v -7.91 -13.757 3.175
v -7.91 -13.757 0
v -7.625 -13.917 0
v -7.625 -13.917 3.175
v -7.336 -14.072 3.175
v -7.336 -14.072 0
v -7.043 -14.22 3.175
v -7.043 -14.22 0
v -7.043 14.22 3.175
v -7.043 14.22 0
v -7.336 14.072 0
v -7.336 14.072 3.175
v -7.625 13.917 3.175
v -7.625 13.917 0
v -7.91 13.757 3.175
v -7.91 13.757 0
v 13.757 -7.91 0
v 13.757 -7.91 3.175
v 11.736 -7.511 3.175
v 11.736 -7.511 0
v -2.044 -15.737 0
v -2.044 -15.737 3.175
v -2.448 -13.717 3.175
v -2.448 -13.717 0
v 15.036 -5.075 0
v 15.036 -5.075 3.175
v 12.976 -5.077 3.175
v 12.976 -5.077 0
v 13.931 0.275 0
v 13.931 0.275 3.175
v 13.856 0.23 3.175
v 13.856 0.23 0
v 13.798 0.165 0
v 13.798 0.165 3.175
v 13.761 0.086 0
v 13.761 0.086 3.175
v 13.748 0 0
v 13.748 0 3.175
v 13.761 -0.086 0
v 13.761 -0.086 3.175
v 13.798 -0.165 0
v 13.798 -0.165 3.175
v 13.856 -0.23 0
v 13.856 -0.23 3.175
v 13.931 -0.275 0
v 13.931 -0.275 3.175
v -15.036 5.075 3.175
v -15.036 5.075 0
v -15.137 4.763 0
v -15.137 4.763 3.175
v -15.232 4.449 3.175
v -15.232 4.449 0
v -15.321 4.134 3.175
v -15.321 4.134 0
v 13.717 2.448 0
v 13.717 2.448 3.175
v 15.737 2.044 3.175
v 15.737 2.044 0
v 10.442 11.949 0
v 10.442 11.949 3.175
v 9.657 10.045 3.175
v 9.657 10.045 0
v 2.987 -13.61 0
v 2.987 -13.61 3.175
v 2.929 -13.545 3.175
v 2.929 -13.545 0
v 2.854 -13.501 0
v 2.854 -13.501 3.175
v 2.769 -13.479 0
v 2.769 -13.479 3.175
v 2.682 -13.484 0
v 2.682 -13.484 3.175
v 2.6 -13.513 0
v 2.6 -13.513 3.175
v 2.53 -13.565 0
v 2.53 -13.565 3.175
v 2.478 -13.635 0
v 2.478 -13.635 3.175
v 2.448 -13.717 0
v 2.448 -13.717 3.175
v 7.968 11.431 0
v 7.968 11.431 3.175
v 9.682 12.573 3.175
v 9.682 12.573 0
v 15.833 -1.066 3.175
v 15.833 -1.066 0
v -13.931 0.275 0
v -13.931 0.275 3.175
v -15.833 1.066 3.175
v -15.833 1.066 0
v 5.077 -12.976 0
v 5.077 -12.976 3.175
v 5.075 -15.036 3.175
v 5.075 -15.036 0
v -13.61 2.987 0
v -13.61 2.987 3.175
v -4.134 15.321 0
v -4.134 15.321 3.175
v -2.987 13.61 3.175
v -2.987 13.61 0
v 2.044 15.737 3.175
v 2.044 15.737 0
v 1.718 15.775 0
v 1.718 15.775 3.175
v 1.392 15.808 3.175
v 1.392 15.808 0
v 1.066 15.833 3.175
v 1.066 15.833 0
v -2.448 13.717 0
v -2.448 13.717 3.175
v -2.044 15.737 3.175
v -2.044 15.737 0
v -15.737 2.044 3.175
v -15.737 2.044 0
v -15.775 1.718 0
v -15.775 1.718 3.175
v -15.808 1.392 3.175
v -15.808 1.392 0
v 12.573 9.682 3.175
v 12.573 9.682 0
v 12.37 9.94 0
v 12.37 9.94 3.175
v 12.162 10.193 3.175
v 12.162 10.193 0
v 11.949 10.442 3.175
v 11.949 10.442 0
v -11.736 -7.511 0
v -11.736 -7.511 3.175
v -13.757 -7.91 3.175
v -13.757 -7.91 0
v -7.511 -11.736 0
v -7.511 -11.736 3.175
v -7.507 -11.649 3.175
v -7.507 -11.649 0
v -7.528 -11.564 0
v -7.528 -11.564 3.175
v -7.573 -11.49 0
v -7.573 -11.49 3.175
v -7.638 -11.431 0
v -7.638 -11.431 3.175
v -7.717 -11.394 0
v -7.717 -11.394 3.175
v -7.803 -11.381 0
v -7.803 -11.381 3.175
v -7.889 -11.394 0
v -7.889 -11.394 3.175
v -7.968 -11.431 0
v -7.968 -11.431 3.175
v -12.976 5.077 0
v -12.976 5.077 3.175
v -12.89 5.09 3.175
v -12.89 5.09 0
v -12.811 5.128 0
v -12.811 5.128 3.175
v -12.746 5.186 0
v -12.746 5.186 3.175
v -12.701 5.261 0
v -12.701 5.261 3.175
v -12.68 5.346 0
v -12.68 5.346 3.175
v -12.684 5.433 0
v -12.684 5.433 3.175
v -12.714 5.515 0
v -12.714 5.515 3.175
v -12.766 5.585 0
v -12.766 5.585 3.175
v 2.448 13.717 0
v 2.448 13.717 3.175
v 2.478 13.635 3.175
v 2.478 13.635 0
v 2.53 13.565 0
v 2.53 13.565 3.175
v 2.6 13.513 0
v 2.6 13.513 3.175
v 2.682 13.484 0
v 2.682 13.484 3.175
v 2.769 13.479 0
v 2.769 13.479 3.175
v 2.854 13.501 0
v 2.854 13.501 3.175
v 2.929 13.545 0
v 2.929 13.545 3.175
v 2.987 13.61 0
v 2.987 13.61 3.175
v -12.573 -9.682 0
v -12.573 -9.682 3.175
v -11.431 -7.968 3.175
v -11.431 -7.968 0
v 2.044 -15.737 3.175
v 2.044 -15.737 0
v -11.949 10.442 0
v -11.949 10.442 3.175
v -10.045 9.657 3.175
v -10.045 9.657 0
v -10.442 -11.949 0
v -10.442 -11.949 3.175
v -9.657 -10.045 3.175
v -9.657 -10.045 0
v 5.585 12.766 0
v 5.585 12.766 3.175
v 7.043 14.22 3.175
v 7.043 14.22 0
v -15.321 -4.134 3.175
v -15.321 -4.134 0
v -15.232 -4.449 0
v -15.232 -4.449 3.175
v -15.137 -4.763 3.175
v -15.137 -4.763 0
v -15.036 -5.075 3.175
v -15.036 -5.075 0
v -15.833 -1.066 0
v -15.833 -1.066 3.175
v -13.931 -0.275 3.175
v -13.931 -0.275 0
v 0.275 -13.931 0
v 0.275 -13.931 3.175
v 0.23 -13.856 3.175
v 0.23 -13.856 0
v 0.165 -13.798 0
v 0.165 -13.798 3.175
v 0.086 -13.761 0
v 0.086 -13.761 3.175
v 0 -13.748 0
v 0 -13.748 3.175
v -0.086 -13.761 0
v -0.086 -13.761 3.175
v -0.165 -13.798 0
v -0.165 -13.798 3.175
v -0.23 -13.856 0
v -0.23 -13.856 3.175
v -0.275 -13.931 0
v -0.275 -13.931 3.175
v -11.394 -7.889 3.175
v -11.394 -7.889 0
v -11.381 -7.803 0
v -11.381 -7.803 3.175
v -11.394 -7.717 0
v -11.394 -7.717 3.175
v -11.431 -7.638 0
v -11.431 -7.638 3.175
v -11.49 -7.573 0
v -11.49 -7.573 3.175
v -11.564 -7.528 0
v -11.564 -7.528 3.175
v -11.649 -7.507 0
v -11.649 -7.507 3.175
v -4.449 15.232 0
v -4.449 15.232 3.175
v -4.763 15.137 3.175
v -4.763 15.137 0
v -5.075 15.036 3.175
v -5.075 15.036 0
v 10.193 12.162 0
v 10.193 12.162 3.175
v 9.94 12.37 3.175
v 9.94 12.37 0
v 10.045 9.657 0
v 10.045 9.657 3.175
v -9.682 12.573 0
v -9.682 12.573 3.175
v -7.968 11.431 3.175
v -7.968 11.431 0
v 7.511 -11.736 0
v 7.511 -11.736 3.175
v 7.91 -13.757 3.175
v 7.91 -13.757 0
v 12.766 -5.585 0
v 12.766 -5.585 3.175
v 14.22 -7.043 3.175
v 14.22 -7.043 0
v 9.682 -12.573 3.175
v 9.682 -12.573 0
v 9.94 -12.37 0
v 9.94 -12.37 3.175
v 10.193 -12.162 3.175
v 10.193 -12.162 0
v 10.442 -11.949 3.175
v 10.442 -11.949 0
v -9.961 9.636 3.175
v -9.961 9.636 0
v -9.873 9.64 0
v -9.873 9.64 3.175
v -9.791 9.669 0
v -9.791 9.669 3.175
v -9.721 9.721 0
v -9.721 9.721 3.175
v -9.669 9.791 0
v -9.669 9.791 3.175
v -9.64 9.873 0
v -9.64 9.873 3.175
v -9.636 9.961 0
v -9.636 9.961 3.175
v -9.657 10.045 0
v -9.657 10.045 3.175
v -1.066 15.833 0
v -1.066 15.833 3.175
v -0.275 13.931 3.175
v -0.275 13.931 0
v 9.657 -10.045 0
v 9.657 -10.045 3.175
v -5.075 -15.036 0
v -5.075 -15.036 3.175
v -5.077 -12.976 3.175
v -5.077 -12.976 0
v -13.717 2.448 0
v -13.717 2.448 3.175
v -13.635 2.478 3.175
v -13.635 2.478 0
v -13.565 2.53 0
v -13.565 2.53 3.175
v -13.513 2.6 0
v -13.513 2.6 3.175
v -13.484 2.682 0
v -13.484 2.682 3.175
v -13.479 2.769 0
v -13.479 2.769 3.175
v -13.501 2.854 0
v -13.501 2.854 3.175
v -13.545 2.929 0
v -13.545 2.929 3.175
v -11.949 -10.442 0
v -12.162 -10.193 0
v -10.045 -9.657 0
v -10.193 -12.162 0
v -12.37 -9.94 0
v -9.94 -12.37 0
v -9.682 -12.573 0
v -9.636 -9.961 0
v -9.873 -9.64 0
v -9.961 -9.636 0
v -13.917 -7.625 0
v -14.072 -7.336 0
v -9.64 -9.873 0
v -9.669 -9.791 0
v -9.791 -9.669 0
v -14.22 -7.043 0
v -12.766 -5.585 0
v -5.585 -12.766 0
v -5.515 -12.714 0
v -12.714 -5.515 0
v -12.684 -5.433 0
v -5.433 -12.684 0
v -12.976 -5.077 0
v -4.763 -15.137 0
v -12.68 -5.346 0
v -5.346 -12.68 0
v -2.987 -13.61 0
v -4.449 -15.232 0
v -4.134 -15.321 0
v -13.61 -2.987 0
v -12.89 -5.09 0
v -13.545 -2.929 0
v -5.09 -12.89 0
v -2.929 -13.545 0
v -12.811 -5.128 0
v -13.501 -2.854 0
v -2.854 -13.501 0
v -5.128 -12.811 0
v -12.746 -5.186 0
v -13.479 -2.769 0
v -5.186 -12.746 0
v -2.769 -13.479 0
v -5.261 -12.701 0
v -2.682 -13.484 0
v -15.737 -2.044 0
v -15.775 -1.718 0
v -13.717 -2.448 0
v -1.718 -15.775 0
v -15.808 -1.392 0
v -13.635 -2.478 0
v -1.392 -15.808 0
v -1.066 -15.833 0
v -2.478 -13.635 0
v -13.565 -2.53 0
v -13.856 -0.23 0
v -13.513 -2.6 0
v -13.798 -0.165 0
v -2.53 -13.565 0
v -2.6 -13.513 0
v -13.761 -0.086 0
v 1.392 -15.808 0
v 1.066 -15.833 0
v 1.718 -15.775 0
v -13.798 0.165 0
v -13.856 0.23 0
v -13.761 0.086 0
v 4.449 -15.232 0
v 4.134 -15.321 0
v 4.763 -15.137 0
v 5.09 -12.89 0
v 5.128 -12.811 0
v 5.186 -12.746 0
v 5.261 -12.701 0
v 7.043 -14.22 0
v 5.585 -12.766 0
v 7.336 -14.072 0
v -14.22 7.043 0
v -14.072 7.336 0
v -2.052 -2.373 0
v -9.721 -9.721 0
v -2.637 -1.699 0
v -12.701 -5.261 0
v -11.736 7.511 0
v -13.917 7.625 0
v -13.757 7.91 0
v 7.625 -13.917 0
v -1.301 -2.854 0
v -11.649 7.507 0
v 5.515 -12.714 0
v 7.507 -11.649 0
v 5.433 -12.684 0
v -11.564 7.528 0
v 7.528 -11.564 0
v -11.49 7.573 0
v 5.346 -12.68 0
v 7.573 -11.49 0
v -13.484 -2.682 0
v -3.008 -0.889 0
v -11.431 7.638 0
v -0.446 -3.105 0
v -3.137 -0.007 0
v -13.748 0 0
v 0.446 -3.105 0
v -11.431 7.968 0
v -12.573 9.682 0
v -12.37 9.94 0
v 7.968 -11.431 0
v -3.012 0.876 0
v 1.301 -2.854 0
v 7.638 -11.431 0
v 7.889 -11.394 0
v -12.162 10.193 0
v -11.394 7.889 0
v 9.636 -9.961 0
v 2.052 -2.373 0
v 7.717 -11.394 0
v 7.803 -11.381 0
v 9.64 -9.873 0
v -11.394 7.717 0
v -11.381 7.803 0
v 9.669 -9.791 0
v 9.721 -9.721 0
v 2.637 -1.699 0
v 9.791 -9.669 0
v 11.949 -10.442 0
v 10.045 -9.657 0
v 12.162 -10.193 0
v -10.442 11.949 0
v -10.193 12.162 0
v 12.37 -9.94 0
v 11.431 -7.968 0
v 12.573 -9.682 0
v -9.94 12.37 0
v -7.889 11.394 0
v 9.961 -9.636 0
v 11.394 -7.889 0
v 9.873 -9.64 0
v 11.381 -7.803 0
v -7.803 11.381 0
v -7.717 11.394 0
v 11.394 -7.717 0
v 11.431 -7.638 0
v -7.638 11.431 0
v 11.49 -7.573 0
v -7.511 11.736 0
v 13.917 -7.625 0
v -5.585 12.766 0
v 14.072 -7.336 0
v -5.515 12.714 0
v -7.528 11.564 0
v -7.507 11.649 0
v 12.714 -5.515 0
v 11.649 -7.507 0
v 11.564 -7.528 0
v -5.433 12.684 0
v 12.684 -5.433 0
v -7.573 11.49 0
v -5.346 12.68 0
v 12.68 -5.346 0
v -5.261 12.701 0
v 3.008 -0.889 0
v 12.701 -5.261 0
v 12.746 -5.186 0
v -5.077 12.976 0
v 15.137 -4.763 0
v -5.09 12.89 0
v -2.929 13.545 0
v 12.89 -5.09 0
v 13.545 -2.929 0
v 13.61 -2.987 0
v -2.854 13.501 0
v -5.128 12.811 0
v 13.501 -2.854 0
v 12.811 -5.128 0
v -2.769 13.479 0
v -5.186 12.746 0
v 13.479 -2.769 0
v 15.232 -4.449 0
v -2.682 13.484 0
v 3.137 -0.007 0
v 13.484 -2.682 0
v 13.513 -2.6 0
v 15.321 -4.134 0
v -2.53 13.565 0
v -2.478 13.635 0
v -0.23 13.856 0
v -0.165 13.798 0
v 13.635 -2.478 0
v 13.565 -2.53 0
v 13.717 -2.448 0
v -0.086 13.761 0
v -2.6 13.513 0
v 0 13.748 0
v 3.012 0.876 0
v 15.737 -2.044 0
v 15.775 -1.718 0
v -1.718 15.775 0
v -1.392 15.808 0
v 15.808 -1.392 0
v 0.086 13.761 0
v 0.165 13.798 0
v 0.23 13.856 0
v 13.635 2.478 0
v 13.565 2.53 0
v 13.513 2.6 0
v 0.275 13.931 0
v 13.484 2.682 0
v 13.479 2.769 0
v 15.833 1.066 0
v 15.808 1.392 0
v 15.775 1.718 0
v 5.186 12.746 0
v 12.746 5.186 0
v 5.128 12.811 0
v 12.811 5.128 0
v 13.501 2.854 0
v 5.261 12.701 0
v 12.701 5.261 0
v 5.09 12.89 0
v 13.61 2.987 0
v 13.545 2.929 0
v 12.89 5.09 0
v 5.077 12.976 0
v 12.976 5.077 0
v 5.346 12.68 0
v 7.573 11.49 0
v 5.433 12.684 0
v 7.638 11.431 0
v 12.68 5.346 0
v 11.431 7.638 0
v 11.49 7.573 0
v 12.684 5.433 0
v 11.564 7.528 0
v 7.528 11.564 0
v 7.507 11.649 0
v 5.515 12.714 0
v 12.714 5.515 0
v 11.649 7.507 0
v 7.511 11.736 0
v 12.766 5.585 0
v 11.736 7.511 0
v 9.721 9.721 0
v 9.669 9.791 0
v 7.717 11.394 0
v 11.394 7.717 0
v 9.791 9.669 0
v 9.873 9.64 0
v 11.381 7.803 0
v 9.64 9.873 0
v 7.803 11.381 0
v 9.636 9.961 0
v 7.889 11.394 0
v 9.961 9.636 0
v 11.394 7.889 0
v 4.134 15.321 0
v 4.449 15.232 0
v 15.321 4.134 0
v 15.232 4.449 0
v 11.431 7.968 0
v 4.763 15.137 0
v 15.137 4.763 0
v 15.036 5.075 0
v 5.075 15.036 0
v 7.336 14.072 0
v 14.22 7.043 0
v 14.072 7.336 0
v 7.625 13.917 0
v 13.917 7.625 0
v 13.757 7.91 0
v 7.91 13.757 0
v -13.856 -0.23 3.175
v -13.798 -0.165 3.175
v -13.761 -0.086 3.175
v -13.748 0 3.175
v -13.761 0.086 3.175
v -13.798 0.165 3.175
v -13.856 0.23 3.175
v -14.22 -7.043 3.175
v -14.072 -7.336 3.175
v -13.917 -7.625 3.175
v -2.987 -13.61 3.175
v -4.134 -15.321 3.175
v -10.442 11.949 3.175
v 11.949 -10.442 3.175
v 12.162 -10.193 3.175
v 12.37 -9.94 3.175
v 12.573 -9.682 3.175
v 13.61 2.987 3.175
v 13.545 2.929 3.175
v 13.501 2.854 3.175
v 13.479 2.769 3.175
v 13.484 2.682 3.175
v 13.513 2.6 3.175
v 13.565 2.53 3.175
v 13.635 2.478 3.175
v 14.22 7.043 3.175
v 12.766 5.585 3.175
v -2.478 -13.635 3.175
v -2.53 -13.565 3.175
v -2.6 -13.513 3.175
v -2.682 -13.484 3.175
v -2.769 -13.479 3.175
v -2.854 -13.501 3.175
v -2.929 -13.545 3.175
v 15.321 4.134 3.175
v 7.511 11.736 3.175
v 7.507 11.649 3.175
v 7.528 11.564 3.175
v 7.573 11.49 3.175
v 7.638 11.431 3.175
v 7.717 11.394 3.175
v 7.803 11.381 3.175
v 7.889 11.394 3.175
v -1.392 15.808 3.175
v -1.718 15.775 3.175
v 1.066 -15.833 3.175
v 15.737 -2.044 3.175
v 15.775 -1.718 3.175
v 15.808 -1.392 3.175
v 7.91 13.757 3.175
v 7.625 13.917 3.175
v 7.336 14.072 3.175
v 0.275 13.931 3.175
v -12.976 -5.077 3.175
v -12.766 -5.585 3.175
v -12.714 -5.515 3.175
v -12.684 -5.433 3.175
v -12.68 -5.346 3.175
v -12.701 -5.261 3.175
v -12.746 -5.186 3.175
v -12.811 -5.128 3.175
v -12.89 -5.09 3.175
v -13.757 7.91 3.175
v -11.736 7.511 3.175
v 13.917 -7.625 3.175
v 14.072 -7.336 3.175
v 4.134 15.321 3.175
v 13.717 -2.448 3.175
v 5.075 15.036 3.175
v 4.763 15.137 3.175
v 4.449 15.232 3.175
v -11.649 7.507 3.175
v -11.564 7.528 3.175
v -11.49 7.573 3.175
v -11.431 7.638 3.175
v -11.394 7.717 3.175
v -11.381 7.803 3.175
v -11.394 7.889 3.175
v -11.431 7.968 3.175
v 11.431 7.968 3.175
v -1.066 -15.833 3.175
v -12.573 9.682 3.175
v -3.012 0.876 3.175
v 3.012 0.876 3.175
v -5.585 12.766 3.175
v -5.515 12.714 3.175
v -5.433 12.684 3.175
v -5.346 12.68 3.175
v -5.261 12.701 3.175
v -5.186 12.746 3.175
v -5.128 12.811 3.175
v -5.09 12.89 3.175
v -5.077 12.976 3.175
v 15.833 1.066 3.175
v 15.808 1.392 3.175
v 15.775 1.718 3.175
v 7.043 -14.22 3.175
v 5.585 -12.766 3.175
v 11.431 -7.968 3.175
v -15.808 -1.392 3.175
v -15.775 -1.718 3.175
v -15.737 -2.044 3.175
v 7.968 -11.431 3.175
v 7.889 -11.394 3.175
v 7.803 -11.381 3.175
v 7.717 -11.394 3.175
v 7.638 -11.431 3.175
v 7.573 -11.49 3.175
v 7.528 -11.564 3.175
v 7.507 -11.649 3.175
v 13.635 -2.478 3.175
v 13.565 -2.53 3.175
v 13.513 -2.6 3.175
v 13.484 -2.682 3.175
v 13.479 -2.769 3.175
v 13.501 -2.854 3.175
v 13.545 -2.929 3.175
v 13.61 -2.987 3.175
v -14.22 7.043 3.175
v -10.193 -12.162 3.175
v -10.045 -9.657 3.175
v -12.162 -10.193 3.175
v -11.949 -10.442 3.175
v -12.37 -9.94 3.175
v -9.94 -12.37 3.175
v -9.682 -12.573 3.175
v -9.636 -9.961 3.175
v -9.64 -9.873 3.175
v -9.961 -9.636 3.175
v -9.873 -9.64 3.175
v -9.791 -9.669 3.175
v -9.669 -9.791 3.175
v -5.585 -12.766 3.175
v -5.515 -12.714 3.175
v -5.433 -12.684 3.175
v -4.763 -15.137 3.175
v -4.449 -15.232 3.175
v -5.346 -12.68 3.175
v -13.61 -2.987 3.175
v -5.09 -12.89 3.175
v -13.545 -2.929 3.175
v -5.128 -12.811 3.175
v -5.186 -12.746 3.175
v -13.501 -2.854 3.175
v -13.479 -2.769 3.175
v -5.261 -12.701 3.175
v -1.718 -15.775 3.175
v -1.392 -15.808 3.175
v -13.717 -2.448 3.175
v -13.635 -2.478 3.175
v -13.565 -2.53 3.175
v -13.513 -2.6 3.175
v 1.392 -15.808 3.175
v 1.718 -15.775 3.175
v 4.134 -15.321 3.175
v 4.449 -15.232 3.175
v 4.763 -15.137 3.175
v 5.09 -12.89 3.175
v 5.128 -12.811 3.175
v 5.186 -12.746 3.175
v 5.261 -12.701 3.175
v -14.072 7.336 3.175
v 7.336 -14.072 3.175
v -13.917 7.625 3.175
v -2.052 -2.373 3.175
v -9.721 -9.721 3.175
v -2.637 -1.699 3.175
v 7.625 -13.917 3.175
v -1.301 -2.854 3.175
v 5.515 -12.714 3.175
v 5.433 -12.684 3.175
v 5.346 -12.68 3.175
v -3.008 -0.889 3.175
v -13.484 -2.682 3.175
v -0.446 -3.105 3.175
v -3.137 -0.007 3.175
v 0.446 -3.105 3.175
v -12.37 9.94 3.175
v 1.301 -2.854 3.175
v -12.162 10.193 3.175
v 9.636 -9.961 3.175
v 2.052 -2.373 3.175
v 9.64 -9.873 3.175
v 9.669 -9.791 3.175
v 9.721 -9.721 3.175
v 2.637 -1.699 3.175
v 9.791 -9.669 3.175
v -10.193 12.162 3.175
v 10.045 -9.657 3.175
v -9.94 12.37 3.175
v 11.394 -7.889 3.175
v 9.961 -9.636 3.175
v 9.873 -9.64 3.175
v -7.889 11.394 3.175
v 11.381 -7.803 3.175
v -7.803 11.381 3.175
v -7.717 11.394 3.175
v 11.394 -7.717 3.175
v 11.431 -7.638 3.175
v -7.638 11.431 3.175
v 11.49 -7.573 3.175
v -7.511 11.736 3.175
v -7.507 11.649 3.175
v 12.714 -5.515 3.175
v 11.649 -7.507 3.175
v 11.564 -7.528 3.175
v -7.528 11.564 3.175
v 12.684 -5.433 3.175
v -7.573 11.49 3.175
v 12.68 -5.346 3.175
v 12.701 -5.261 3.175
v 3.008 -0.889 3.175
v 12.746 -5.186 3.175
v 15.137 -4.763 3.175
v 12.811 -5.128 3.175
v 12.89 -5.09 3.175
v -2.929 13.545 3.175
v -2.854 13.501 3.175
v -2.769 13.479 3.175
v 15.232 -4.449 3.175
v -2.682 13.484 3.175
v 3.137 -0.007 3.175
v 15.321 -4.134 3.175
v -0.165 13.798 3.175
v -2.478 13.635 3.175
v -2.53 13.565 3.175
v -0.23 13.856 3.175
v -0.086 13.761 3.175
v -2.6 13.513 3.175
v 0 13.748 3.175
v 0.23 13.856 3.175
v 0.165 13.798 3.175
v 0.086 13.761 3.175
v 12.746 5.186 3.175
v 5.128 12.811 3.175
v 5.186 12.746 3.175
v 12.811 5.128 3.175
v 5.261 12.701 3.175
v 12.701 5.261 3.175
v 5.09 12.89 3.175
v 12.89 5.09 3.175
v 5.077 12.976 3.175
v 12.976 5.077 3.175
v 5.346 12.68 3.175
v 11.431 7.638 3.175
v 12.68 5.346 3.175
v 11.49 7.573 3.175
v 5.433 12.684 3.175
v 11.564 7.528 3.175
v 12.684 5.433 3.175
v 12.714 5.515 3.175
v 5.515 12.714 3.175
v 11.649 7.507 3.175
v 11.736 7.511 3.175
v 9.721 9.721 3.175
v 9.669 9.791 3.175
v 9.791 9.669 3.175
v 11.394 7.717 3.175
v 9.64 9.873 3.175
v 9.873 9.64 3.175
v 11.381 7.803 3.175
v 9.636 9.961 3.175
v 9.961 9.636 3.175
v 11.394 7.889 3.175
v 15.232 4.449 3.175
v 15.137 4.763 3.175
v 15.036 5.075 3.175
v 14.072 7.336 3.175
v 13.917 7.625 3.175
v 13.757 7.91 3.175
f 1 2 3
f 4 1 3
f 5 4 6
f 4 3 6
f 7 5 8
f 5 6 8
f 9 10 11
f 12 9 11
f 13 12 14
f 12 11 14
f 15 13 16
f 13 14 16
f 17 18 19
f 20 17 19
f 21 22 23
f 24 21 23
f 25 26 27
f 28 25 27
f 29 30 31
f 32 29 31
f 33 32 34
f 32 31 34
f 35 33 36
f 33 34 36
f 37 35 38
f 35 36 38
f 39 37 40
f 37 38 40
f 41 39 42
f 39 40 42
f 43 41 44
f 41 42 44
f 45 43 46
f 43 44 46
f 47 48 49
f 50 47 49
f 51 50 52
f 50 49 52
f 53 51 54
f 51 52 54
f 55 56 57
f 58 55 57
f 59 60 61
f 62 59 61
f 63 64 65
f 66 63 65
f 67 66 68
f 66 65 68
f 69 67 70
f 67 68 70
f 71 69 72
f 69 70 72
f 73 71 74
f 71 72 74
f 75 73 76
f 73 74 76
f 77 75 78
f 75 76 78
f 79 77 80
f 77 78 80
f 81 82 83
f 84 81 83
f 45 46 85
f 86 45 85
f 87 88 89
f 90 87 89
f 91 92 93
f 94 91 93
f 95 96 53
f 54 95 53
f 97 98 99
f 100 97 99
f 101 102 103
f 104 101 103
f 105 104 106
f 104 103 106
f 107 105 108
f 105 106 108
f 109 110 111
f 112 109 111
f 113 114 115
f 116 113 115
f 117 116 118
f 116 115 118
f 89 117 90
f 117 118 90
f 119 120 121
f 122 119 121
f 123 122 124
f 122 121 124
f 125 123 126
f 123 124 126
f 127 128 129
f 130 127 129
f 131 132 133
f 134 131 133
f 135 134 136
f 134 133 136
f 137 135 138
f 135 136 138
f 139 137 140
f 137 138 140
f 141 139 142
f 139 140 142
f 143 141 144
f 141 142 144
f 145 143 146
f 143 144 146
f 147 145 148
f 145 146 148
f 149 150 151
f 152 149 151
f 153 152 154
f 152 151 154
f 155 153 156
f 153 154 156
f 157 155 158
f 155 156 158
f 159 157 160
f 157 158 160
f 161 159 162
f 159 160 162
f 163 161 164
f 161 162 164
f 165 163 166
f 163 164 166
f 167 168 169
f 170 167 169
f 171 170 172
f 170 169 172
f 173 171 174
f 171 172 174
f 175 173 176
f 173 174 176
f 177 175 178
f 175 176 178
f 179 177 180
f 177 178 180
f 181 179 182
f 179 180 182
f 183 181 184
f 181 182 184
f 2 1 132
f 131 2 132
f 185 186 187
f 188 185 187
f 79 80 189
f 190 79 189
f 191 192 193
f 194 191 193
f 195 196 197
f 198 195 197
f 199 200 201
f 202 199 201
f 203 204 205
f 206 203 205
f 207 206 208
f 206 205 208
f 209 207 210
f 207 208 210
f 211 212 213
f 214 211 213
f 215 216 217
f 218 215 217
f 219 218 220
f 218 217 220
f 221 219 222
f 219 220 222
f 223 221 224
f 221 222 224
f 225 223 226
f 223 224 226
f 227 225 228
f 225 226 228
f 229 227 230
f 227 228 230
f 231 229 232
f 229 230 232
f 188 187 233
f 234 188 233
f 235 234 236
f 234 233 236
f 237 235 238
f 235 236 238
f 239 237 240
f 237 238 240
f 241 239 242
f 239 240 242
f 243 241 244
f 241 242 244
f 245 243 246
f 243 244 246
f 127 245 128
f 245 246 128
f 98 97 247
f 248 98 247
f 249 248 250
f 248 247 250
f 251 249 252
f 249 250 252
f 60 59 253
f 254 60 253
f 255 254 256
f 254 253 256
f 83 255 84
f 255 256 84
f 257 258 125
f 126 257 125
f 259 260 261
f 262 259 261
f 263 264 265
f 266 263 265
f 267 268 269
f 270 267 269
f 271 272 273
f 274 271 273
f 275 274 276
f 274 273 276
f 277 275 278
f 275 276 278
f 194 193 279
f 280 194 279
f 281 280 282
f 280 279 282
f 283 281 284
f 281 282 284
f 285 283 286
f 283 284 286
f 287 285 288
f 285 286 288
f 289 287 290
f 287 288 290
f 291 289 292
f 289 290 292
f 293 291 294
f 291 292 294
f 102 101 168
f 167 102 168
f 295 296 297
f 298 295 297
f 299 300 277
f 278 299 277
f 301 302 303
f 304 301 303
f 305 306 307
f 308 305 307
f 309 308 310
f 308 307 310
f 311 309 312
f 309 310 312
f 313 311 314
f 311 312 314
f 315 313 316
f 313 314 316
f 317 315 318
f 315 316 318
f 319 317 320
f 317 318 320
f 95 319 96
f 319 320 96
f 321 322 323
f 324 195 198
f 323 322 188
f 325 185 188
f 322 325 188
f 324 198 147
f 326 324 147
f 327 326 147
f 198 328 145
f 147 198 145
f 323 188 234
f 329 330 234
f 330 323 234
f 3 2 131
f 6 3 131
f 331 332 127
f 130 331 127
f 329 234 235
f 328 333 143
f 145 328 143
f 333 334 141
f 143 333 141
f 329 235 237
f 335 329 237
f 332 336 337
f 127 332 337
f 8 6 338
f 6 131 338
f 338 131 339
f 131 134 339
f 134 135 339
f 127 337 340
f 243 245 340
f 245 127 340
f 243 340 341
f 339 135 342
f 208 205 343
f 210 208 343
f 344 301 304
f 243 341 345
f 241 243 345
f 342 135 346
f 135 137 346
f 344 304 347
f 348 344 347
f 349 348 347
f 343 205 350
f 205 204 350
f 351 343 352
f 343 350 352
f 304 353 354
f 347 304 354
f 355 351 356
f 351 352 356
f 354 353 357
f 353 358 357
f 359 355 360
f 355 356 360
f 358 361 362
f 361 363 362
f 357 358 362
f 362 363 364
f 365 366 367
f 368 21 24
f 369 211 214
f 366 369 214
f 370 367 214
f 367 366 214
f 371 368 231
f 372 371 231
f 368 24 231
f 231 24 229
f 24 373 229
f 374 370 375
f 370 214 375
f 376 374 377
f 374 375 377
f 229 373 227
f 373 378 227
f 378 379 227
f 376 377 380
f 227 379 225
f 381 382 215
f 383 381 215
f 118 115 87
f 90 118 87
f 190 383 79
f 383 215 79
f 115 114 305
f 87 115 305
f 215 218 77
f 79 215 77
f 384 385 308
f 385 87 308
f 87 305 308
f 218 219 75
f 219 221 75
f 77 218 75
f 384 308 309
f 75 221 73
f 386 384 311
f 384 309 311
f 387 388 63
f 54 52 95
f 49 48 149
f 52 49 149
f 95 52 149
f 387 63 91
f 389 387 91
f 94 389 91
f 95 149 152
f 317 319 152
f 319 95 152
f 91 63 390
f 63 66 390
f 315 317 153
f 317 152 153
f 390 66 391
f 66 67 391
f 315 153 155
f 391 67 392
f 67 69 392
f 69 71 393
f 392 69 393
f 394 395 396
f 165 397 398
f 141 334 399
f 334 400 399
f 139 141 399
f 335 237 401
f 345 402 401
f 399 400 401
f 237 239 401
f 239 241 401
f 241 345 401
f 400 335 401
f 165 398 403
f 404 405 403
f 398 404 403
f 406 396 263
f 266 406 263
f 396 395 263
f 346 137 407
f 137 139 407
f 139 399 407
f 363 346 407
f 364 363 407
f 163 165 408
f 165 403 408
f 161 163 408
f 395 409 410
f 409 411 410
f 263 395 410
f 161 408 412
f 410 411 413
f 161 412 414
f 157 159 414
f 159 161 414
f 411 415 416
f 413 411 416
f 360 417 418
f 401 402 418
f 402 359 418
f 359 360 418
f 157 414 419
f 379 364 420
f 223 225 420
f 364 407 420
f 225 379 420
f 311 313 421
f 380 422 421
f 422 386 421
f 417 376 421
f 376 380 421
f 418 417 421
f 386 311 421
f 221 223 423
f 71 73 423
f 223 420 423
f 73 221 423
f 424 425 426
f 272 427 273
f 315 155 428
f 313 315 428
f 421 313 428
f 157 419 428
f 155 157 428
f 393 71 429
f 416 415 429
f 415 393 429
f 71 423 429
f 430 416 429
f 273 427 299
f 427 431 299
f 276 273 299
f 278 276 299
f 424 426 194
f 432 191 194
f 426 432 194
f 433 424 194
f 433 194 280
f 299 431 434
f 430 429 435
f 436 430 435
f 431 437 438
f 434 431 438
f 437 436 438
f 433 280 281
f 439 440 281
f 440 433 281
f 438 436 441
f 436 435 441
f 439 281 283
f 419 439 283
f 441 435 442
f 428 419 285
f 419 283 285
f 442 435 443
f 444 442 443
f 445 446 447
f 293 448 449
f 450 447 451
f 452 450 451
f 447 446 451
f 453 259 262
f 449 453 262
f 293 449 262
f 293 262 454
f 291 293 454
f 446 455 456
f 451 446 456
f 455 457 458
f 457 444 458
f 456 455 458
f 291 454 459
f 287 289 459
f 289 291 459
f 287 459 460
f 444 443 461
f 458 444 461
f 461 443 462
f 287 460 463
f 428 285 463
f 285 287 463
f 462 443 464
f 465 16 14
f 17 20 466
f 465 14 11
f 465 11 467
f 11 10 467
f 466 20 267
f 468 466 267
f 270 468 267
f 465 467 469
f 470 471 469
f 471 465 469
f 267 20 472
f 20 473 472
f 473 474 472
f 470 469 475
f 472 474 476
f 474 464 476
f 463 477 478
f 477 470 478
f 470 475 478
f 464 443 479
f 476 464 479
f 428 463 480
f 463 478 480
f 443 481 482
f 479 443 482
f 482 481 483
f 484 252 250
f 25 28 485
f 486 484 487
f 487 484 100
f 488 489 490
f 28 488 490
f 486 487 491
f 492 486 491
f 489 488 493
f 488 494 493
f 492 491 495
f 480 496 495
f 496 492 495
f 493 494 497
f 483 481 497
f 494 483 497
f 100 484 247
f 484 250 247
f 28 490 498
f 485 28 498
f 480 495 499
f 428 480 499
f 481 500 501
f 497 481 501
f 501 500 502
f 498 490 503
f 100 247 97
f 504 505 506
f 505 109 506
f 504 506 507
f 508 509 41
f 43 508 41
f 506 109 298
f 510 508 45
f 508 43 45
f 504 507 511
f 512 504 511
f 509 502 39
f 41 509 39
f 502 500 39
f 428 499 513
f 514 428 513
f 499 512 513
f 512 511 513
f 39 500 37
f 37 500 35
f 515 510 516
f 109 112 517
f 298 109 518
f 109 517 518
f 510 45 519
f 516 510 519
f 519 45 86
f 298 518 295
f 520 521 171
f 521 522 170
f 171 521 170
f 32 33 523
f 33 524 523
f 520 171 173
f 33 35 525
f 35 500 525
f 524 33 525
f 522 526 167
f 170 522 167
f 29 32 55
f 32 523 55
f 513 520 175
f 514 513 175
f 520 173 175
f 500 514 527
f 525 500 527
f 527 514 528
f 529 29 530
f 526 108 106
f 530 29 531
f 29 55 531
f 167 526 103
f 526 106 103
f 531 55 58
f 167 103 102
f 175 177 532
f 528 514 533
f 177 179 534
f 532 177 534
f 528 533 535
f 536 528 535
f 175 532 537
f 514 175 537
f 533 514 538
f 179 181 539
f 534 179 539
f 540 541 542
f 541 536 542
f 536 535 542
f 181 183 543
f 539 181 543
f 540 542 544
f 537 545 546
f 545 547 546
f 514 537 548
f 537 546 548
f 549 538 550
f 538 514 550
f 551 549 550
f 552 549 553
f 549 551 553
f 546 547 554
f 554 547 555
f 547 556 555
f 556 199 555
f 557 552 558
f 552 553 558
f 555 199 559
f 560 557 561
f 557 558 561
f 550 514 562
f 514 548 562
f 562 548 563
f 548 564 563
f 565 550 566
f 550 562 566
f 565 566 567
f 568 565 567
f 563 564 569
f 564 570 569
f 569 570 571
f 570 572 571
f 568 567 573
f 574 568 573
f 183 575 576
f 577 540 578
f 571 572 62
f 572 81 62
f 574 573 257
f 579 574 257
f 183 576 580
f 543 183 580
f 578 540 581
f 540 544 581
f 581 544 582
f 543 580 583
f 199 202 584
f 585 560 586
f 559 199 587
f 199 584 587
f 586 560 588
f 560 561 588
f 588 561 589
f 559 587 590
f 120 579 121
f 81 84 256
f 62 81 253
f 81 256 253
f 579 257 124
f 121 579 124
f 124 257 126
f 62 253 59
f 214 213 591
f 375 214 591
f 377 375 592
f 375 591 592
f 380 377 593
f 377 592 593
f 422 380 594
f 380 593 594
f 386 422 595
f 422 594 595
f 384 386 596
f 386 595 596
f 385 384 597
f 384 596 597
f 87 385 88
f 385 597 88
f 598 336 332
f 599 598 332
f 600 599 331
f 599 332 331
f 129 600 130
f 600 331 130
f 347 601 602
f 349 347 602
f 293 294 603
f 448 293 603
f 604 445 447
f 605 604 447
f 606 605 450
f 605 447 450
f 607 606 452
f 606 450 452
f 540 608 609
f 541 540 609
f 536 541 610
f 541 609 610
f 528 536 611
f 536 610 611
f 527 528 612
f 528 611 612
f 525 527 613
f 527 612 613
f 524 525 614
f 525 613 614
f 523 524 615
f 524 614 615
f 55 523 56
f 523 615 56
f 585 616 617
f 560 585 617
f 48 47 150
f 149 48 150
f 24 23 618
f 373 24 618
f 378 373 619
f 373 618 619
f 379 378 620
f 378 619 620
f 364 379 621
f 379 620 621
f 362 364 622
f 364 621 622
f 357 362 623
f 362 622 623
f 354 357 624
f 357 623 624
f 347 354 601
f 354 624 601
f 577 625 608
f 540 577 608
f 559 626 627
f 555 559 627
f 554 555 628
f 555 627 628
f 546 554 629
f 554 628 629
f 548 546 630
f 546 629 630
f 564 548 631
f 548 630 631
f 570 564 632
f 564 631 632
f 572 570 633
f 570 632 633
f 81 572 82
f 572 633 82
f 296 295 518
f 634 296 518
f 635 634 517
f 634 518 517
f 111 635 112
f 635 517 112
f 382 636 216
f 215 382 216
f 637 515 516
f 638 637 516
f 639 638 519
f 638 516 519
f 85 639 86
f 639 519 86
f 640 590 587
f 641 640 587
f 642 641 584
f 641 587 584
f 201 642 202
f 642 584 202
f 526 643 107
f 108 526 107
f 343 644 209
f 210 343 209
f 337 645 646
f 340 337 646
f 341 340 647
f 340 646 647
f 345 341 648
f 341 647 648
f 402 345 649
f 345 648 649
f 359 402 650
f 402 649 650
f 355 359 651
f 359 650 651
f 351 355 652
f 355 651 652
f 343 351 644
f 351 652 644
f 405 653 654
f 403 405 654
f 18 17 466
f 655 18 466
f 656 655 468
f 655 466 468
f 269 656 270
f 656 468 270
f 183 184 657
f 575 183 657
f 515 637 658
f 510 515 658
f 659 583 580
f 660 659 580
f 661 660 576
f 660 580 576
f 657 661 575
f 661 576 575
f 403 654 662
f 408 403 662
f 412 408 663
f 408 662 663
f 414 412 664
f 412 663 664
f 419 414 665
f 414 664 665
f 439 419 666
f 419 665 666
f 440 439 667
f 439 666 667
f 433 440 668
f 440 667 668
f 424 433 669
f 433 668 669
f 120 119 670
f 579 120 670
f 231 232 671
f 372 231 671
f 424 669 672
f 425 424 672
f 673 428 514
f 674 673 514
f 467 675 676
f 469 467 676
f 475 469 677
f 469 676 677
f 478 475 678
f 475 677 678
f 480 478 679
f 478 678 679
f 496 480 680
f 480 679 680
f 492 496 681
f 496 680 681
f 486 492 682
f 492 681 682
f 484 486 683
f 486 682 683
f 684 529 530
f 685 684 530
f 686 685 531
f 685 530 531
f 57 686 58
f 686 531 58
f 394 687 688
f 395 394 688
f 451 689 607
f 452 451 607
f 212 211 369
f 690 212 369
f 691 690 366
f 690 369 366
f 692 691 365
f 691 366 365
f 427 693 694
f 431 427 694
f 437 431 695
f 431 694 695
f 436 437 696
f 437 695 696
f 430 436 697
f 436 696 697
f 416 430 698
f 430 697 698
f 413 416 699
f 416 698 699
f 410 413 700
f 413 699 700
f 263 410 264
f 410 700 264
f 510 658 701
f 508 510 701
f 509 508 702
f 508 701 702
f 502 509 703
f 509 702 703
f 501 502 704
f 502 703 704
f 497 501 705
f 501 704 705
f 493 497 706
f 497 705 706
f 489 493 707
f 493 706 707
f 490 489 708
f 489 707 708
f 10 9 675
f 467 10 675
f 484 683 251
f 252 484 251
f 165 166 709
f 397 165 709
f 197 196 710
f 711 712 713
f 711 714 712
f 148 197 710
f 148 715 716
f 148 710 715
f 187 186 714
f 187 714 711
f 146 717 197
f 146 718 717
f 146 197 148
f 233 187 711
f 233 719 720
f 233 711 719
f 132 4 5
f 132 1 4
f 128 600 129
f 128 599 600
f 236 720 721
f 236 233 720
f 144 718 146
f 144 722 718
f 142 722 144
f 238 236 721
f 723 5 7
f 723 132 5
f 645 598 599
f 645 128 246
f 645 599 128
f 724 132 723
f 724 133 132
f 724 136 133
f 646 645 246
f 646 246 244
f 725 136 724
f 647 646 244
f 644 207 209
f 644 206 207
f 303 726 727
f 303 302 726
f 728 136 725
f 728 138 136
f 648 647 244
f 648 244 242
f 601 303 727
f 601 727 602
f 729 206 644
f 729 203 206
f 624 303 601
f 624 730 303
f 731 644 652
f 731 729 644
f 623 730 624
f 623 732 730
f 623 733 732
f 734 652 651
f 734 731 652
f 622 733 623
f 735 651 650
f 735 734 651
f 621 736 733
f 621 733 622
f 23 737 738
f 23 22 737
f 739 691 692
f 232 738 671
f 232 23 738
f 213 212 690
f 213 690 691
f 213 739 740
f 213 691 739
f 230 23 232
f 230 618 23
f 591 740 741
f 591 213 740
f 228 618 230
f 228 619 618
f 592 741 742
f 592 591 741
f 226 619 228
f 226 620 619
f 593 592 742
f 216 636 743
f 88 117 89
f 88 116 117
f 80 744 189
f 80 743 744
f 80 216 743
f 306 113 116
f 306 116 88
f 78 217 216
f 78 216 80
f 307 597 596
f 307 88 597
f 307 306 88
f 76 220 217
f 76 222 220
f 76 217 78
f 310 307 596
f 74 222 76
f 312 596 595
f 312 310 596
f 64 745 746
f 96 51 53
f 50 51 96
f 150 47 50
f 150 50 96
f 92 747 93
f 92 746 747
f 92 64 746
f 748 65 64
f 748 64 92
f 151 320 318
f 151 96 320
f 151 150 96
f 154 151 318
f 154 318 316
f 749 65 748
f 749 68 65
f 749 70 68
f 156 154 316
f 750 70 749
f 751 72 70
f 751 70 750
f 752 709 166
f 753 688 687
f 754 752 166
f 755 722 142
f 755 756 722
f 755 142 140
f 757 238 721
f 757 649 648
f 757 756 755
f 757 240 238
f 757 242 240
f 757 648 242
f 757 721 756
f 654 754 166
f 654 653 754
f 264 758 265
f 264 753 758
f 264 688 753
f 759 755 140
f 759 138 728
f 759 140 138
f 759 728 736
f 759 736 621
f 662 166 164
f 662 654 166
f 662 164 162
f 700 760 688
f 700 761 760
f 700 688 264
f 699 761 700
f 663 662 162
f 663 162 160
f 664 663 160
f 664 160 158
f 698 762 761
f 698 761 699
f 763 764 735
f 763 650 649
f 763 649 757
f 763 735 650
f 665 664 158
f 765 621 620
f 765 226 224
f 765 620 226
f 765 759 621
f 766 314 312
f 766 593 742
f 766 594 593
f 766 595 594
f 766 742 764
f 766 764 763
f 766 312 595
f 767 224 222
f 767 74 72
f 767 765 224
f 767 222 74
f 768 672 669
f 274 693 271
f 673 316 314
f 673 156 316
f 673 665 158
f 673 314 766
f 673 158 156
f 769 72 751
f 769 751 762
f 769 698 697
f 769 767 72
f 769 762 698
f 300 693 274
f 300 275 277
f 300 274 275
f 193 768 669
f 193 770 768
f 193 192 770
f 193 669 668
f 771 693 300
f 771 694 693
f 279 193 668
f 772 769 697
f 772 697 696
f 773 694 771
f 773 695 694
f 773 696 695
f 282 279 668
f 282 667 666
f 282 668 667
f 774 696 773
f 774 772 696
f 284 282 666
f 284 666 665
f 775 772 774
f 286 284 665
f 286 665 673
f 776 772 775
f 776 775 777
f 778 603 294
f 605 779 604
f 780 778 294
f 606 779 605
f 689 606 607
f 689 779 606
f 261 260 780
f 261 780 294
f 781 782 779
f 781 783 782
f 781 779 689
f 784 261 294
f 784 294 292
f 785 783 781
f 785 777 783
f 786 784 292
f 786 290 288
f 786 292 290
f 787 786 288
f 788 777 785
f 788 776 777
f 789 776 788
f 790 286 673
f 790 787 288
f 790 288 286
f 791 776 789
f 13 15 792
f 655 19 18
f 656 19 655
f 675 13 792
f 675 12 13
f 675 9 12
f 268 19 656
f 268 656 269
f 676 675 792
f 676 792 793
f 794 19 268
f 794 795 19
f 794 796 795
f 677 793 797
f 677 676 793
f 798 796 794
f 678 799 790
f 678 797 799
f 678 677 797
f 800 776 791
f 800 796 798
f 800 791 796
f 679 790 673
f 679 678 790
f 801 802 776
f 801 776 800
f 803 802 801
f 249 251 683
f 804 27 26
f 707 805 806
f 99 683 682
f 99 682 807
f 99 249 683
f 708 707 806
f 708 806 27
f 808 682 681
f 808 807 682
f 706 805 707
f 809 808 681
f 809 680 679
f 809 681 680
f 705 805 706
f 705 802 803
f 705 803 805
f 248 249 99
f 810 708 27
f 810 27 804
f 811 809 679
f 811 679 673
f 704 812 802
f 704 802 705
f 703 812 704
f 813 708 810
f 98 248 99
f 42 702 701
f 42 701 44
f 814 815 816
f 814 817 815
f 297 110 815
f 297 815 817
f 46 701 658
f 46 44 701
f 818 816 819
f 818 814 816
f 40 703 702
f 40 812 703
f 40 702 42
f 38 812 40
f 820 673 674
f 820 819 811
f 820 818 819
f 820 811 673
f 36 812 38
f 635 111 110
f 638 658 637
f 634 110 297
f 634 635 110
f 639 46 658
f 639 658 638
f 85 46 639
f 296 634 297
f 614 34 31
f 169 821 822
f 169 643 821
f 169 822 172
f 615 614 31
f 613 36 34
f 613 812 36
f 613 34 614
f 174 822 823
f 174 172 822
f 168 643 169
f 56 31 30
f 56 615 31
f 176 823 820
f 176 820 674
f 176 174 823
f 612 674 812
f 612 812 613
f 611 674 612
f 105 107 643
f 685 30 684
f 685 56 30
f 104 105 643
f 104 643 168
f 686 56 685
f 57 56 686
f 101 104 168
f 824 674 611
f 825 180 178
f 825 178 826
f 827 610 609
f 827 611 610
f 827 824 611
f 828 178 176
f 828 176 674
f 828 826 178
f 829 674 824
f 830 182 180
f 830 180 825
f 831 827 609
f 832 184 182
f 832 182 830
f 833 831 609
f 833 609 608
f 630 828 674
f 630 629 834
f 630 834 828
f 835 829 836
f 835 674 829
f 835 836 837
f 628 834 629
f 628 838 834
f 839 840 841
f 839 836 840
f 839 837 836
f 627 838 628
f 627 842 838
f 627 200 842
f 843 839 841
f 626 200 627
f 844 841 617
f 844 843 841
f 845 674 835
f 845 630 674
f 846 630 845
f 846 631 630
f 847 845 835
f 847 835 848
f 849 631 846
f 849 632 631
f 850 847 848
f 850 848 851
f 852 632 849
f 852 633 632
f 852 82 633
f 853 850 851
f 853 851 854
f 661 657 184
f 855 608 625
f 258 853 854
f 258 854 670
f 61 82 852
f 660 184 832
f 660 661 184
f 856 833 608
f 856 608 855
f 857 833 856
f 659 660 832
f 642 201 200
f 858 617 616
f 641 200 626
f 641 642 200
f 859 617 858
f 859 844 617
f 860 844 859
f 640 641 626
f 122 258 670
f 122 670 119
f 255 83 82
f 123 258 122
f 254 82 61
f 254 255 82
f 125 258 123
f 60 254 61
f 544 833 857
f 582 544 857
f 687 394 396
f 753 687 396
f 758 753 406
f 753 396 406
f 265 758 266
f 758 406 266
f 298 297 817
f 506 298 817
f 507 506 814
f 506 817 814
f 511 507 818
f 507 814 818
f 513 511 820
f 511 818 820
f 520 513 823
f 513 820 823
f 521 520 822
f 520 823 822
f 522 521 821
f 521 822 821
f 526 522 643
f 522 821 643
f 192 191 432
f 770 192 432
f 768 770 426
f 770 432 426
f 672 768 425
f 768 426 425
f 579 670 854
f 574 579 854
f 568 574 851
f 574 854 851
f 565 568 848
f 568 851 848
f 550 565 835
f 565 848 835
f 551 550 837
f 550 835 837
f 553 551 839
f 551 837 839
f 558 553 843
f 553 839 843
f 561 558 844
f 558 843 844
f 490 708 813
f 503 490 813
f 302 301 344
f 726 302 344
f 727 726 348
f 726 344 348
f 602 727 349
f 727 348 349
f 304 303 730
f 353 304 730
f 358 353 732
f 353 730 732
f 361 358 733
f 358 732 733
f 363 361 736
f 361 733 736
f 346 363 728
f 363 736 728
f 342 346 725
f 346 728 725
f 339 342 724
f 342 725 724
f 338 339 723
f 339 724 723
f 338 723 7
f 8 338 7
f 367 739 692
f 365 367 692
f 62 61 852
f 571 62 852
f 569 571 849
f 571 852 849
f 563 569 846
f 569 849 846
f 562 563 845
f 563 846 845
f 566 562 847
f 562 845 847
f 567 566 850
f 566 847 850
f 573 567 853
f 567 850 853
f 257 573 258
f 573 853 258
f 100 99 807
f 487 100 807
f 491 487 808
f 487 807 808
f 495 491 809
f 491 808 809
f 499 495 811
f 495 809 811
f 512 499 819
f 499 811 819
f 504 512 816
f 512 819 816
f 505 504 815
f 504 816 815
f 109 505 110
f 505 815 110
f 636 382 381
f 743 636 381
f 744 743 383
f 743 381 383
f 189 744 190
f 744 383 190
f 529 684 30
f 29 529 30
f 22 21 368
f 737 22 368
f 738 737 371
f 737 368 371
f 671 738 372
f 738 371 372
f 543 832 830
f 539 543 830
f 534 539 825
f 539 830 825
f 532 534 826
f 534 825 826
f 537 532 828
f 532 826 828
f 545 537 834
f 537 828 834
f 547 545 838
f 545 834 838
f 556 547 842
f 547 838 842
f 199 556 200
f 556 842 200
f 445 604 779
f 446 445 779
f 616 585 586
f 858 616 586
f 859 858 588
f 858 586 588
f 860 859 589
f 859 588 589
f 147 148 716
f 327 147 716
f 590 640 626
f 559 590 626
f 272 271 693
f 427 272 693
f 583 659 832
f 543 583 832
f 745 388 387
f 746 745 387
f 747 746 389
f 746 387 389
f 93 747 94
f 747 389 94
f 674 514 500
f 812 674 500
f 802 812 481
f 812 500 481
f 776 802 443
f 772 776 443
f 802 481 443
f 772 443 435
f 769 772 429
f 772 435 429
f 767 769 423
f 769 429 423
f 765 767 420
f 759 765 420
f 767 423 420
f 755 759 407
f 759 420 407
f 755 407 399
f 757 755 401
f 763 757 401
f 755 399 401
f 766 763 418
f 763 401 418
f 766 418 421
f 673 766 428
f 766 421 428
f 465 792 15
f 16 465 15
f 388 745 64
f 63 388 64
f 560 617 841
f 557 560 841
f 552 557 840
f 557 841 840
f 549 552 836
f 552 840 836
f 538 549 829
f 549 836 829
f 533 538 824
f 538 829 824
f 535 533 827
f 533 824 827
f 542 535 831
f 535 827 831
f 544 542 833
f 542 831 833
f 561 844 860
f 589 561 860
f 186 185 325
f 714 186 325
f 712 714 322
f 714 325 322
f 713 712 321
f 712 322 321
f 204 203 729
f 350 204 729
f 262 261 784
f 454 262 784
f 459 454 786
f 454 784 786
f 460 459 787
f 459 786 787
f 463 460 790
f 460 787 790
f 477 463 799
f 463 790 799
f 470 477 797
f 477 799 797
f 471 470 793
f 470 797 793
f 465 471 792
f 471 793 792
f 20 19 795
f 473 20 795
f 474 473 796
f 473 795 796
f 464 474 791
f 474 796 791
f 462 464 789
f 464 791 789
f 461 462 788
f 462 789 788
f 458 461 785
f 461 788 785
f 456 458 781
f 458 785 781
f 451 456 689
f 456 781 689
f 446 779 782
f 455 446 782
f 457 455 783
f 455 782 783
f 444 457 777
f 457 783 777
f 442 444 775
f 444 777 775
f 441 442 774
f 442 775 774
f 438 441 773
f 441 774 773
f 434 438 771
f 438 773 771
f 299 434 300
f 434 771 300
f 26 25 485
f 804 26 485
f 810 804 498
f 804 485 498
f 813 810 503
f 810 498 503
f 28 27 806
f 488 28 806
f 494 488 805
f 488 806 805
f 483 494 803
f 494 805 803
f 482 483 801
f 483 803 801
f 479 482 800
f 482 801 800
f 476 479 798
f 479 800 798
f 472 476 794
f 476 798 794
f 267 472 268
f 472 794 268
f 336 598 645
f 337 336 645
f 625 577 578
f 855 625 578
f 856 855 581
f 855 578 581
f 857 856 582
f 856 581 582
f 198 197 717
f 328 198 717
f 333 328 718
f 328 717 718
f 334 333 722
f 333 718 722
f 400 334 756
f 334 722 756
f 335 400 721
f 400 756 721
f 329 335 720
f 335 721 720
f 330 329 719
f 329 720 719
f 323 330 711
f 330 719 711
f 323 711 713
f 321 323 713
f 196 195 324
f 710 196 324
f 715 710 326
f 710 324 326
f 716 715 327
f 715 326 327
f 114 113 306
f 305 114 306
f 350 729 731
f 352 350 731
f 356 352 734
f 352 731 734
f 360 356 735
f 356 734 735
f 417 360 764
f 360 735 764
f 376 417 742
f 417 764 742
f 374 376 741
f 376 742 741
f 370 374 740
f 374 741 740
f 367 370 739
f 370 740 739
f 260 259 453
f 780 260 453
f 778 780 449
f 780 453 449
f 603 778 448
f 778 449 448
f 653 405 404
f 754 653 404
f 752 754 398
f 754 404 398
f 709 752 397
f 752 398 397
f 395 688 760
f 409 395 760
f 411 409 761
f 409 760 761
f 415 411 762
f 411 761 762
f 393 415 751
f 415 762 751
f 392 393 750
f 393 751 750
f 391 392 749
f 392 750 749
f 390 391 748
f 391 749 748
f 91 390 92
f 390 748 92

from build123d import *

# Parameters (mm, degrees)
F0_R            = 15.8688012495
F1_DEPTH        = 3.175
F3_DEPTH        = 3.175
F3_COPIES_COUNT = 32


# Not quite as in the source:
# - a pattern or mirror of a feature is missing from the dataset's text; its kind, count and spacing are read off the source's solid


with BuildPart() as f1:
    # F0 (on Top) → F1 (new body)
    with BuildSketch(Plane.XY):
        Circle(F0_R)
        with BuildLine():
            ThreePointArc((3.0120159229, 0.8763), (0, -3.1369), (-3.0120159229, 0.8763))
            Line((-3.0120159229, 0.8763), (3.0120159229, 0.8763))
        make_face(mode=Mode.SUBTRACT)
    extrude(amount=F1_DEPTH)

    # F2 (on face) → F3 (cut, through all)
    with BuildSketch(Plane.XY.offset(3.175)):
        with BuildLine():
            Line((-13.9312413972, 0.274735453), (-15.8329891451, 1.065508248))
            ThreePointArc((-15.8329891451, 1.065508248), (-15.8688012495, 0), (-15.8329891451, -1.065508248))
            Line((-15.8329891451, -1.065508248), (-13.9312413972, -0.274735453))
            ThreePointArc((-13.9312413972, -0.274735453), (-13.747940143, 0), (-13.9312413972, 0.274735453))
        make_face()
    f3 = extrude(amount=-F3_DEPTH, mode=Mode.SUBTRACT)

    # F3_copies: F3 ×32 about axis
    f3_copies_axis = Axis((0, 0, 0), (0, 0, 1))
    for i in range(1, F3_COPIES_COUNT):
        add(f3.rotate(f3_copies_axis, i * 360 / F3_COPIES_COUNT), mode=Mode.SUBTRACT)


solid = f1.part
